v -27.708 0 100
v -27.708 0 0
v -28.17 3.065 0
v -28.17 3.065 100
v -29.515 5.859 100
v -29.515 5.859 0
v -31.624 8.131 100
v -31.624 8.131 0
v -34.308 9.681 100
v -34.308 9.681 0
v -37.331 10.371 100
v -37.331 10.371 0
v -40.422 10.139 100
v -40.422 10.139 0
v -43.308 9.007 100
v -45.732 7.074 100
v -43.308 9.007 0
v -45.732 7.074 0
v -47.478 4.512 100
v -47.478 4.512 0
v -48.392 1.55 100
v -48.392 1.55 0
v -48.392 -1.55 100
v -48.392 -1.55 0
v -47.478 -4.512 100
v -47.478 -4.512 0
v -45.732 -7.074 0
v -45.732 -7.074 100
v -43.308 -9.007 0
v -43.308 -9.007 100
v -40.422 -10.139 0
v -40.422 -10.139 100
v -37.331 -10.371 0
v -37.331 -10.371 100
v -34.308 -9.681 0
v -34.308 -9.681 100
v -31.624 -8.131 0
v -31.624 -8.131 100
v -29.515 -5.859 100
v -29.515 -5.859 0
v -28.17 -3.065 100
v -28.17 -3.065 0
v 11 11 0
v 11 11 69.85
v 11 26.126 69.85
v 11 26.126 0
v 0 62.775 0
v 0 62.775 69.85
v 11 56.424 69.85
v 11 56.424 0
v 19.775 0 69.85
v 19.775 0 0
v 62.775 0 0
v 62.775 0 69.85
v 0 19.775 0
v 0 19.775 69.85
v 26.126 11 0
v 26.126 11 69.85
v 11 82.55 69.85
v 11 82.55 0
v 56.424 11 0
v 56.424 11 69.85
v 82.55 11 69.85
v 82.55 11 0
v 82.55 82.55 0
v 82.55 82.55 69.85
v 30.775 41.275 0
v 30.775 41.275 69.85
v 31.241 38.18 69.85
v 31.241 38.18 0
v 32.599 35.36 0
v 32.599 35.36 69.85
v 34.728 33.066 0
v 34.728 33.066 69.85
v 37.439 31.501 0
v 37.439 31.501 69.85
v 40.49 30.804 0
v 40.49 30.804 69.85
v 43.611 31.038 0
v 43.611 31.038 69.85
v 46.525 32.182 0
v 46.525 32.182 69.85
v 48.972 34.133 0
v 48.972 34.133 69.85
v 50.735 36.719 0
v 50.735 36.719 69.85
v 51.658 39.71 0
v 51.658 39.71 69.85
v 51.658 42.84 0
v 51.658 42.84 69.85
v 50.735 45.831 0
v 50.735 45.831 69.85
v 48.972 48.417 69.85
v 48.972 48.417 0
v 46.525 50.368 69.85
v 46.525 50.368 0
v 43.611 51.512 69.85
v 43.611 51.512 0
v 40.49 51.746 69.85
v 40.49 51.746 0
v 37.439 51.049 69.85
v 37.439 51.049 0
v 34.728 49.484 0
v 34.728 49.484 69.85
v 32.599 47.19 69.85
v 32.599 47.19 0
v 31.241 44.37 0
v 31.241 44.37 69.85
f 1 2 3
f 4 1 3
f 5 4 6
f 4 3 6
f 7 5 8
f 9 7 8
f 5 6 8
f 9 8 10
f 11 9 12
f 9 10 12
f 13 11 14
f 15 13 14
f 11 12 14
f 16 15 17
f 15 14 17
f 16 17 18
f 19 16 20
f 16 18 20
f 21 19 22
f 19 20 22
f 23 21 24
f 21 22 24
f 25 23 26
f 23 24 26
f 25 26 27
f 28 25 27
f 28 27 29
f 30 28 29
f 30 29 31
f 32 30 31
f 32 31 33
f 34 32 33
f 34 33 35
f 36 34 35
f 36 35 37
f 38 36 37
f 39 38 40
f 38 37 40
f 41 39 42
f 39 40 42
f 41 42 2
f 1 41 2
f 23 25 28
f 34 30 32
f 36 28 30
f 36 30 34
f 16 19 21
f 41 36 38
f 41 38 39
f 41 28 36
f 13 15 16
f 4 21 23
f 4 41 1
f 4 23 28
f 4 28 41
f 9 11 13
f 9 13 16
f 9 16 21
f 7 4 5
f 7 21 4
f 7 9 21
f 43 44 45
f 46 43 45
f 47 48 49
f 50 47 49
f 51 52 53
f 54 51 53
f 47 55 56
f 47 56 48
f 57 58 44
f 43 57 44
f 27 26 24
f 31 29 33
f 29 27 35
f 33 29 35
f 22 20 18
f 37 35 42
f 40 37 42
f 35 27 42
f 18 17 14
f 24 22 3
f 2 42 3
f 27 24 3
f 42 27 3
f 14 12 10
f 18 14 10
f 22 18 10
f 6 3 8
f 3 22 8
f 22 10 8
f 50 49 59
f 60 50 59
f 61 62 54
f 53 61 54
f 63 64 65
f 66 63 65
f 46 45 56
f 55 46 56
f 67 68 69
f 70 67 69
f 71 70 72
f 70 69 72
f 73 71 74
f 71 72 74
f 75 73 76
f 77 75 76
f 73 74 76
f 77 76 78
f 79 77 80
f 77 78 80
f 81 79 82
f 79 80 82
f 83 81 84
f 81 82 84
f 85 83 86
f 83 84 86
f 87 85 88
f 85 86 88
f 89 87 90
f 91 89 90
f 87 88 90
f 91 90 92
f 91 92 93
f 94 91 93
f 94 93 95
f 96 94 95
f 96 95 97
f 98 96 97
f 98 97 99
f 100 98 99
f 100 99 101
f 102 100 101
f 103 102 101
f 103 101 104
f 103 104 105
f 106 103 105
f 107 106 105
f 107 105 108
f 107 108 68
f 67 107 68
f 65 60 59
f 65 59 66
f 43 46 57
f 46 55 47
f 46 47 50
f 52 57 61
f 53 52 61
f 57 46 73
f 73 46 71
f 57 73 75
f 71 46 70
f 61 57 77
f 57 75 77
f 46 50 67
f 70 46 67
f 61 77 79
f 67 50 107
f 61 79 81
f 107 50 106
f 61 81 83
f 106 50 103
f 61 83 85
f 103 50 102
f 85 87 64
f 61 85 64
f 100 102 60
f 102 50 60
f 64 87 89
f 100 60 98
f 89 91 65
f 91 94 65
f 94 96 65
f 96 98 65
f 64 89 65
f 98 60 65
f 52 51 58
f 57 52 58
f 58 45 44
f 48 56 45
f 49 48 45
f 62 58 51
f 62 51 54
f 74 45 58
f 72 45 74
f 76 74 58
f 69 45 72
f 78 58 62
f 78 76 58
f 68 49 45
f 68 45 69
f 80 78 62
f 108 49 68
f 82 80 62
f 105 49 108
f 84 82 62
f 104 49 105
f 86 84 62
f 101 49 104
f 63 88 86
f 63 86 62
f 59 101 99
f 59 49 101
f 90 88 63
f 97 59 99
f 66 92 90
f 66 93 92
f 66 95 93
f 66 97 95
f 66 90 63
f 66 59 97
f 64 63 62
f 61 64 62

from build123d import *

# Parameters (mm, degrees)
F0_W     = 82.55
F0_H     = 82.55
F1_DEPTH = 69.85
F3_DEPTH = 69.85
F4_D     = 21
F5_R     = 10.4
F6_DEPTH = 100


with BuildPart() as f1:
    # F0 (on Top) → F1 (new body)
    with BuildSketch(Plane.XY):
        with Locations((41.275, 41.275)):
            Rectangle(F0_W, F0_H)
    extrude(amount=F1_DEPTH)

    # F2 (on face) → F3 (cut, through all)
    with BuildSketch(Plane.XY.offset(69.85)):
        Polygon((0, 62.775), (11, 56.4241470389), (11, 82.55), (0, 82.55), align=None)
        Polygon((11, 26.1258529611), (0, 19.775), (0, 0), (19.775, 0), (26.1258529611, 11), (11, 11), align=None)
        Polygon((82.55, 0), (82.55, 11), (56.4241470389, 11), (62.775, 0), align=None)
    extrude(amount=-F3_DEPTH, mode=Mode.SUBTRACT)

    # F4 (through all)
    with Locations(Plane(origin=(0, 0, 0), x_dir=(1, 0, 0), z_dir=(0, 0, -1))):
        with Locations((41.275, -41.275)):
            Hole(F4_D / 2)


with BuildPart() as f6:
    # F5 (on Top) → F6 (new body)
    with BuildSketch(Plane.XY):
        with Locations((-38.1078049541, 0)):
            Circle(F5_R)
    extrude(amount=F6_DEPTH)


solid = Compound([f1.part, f6.part])
